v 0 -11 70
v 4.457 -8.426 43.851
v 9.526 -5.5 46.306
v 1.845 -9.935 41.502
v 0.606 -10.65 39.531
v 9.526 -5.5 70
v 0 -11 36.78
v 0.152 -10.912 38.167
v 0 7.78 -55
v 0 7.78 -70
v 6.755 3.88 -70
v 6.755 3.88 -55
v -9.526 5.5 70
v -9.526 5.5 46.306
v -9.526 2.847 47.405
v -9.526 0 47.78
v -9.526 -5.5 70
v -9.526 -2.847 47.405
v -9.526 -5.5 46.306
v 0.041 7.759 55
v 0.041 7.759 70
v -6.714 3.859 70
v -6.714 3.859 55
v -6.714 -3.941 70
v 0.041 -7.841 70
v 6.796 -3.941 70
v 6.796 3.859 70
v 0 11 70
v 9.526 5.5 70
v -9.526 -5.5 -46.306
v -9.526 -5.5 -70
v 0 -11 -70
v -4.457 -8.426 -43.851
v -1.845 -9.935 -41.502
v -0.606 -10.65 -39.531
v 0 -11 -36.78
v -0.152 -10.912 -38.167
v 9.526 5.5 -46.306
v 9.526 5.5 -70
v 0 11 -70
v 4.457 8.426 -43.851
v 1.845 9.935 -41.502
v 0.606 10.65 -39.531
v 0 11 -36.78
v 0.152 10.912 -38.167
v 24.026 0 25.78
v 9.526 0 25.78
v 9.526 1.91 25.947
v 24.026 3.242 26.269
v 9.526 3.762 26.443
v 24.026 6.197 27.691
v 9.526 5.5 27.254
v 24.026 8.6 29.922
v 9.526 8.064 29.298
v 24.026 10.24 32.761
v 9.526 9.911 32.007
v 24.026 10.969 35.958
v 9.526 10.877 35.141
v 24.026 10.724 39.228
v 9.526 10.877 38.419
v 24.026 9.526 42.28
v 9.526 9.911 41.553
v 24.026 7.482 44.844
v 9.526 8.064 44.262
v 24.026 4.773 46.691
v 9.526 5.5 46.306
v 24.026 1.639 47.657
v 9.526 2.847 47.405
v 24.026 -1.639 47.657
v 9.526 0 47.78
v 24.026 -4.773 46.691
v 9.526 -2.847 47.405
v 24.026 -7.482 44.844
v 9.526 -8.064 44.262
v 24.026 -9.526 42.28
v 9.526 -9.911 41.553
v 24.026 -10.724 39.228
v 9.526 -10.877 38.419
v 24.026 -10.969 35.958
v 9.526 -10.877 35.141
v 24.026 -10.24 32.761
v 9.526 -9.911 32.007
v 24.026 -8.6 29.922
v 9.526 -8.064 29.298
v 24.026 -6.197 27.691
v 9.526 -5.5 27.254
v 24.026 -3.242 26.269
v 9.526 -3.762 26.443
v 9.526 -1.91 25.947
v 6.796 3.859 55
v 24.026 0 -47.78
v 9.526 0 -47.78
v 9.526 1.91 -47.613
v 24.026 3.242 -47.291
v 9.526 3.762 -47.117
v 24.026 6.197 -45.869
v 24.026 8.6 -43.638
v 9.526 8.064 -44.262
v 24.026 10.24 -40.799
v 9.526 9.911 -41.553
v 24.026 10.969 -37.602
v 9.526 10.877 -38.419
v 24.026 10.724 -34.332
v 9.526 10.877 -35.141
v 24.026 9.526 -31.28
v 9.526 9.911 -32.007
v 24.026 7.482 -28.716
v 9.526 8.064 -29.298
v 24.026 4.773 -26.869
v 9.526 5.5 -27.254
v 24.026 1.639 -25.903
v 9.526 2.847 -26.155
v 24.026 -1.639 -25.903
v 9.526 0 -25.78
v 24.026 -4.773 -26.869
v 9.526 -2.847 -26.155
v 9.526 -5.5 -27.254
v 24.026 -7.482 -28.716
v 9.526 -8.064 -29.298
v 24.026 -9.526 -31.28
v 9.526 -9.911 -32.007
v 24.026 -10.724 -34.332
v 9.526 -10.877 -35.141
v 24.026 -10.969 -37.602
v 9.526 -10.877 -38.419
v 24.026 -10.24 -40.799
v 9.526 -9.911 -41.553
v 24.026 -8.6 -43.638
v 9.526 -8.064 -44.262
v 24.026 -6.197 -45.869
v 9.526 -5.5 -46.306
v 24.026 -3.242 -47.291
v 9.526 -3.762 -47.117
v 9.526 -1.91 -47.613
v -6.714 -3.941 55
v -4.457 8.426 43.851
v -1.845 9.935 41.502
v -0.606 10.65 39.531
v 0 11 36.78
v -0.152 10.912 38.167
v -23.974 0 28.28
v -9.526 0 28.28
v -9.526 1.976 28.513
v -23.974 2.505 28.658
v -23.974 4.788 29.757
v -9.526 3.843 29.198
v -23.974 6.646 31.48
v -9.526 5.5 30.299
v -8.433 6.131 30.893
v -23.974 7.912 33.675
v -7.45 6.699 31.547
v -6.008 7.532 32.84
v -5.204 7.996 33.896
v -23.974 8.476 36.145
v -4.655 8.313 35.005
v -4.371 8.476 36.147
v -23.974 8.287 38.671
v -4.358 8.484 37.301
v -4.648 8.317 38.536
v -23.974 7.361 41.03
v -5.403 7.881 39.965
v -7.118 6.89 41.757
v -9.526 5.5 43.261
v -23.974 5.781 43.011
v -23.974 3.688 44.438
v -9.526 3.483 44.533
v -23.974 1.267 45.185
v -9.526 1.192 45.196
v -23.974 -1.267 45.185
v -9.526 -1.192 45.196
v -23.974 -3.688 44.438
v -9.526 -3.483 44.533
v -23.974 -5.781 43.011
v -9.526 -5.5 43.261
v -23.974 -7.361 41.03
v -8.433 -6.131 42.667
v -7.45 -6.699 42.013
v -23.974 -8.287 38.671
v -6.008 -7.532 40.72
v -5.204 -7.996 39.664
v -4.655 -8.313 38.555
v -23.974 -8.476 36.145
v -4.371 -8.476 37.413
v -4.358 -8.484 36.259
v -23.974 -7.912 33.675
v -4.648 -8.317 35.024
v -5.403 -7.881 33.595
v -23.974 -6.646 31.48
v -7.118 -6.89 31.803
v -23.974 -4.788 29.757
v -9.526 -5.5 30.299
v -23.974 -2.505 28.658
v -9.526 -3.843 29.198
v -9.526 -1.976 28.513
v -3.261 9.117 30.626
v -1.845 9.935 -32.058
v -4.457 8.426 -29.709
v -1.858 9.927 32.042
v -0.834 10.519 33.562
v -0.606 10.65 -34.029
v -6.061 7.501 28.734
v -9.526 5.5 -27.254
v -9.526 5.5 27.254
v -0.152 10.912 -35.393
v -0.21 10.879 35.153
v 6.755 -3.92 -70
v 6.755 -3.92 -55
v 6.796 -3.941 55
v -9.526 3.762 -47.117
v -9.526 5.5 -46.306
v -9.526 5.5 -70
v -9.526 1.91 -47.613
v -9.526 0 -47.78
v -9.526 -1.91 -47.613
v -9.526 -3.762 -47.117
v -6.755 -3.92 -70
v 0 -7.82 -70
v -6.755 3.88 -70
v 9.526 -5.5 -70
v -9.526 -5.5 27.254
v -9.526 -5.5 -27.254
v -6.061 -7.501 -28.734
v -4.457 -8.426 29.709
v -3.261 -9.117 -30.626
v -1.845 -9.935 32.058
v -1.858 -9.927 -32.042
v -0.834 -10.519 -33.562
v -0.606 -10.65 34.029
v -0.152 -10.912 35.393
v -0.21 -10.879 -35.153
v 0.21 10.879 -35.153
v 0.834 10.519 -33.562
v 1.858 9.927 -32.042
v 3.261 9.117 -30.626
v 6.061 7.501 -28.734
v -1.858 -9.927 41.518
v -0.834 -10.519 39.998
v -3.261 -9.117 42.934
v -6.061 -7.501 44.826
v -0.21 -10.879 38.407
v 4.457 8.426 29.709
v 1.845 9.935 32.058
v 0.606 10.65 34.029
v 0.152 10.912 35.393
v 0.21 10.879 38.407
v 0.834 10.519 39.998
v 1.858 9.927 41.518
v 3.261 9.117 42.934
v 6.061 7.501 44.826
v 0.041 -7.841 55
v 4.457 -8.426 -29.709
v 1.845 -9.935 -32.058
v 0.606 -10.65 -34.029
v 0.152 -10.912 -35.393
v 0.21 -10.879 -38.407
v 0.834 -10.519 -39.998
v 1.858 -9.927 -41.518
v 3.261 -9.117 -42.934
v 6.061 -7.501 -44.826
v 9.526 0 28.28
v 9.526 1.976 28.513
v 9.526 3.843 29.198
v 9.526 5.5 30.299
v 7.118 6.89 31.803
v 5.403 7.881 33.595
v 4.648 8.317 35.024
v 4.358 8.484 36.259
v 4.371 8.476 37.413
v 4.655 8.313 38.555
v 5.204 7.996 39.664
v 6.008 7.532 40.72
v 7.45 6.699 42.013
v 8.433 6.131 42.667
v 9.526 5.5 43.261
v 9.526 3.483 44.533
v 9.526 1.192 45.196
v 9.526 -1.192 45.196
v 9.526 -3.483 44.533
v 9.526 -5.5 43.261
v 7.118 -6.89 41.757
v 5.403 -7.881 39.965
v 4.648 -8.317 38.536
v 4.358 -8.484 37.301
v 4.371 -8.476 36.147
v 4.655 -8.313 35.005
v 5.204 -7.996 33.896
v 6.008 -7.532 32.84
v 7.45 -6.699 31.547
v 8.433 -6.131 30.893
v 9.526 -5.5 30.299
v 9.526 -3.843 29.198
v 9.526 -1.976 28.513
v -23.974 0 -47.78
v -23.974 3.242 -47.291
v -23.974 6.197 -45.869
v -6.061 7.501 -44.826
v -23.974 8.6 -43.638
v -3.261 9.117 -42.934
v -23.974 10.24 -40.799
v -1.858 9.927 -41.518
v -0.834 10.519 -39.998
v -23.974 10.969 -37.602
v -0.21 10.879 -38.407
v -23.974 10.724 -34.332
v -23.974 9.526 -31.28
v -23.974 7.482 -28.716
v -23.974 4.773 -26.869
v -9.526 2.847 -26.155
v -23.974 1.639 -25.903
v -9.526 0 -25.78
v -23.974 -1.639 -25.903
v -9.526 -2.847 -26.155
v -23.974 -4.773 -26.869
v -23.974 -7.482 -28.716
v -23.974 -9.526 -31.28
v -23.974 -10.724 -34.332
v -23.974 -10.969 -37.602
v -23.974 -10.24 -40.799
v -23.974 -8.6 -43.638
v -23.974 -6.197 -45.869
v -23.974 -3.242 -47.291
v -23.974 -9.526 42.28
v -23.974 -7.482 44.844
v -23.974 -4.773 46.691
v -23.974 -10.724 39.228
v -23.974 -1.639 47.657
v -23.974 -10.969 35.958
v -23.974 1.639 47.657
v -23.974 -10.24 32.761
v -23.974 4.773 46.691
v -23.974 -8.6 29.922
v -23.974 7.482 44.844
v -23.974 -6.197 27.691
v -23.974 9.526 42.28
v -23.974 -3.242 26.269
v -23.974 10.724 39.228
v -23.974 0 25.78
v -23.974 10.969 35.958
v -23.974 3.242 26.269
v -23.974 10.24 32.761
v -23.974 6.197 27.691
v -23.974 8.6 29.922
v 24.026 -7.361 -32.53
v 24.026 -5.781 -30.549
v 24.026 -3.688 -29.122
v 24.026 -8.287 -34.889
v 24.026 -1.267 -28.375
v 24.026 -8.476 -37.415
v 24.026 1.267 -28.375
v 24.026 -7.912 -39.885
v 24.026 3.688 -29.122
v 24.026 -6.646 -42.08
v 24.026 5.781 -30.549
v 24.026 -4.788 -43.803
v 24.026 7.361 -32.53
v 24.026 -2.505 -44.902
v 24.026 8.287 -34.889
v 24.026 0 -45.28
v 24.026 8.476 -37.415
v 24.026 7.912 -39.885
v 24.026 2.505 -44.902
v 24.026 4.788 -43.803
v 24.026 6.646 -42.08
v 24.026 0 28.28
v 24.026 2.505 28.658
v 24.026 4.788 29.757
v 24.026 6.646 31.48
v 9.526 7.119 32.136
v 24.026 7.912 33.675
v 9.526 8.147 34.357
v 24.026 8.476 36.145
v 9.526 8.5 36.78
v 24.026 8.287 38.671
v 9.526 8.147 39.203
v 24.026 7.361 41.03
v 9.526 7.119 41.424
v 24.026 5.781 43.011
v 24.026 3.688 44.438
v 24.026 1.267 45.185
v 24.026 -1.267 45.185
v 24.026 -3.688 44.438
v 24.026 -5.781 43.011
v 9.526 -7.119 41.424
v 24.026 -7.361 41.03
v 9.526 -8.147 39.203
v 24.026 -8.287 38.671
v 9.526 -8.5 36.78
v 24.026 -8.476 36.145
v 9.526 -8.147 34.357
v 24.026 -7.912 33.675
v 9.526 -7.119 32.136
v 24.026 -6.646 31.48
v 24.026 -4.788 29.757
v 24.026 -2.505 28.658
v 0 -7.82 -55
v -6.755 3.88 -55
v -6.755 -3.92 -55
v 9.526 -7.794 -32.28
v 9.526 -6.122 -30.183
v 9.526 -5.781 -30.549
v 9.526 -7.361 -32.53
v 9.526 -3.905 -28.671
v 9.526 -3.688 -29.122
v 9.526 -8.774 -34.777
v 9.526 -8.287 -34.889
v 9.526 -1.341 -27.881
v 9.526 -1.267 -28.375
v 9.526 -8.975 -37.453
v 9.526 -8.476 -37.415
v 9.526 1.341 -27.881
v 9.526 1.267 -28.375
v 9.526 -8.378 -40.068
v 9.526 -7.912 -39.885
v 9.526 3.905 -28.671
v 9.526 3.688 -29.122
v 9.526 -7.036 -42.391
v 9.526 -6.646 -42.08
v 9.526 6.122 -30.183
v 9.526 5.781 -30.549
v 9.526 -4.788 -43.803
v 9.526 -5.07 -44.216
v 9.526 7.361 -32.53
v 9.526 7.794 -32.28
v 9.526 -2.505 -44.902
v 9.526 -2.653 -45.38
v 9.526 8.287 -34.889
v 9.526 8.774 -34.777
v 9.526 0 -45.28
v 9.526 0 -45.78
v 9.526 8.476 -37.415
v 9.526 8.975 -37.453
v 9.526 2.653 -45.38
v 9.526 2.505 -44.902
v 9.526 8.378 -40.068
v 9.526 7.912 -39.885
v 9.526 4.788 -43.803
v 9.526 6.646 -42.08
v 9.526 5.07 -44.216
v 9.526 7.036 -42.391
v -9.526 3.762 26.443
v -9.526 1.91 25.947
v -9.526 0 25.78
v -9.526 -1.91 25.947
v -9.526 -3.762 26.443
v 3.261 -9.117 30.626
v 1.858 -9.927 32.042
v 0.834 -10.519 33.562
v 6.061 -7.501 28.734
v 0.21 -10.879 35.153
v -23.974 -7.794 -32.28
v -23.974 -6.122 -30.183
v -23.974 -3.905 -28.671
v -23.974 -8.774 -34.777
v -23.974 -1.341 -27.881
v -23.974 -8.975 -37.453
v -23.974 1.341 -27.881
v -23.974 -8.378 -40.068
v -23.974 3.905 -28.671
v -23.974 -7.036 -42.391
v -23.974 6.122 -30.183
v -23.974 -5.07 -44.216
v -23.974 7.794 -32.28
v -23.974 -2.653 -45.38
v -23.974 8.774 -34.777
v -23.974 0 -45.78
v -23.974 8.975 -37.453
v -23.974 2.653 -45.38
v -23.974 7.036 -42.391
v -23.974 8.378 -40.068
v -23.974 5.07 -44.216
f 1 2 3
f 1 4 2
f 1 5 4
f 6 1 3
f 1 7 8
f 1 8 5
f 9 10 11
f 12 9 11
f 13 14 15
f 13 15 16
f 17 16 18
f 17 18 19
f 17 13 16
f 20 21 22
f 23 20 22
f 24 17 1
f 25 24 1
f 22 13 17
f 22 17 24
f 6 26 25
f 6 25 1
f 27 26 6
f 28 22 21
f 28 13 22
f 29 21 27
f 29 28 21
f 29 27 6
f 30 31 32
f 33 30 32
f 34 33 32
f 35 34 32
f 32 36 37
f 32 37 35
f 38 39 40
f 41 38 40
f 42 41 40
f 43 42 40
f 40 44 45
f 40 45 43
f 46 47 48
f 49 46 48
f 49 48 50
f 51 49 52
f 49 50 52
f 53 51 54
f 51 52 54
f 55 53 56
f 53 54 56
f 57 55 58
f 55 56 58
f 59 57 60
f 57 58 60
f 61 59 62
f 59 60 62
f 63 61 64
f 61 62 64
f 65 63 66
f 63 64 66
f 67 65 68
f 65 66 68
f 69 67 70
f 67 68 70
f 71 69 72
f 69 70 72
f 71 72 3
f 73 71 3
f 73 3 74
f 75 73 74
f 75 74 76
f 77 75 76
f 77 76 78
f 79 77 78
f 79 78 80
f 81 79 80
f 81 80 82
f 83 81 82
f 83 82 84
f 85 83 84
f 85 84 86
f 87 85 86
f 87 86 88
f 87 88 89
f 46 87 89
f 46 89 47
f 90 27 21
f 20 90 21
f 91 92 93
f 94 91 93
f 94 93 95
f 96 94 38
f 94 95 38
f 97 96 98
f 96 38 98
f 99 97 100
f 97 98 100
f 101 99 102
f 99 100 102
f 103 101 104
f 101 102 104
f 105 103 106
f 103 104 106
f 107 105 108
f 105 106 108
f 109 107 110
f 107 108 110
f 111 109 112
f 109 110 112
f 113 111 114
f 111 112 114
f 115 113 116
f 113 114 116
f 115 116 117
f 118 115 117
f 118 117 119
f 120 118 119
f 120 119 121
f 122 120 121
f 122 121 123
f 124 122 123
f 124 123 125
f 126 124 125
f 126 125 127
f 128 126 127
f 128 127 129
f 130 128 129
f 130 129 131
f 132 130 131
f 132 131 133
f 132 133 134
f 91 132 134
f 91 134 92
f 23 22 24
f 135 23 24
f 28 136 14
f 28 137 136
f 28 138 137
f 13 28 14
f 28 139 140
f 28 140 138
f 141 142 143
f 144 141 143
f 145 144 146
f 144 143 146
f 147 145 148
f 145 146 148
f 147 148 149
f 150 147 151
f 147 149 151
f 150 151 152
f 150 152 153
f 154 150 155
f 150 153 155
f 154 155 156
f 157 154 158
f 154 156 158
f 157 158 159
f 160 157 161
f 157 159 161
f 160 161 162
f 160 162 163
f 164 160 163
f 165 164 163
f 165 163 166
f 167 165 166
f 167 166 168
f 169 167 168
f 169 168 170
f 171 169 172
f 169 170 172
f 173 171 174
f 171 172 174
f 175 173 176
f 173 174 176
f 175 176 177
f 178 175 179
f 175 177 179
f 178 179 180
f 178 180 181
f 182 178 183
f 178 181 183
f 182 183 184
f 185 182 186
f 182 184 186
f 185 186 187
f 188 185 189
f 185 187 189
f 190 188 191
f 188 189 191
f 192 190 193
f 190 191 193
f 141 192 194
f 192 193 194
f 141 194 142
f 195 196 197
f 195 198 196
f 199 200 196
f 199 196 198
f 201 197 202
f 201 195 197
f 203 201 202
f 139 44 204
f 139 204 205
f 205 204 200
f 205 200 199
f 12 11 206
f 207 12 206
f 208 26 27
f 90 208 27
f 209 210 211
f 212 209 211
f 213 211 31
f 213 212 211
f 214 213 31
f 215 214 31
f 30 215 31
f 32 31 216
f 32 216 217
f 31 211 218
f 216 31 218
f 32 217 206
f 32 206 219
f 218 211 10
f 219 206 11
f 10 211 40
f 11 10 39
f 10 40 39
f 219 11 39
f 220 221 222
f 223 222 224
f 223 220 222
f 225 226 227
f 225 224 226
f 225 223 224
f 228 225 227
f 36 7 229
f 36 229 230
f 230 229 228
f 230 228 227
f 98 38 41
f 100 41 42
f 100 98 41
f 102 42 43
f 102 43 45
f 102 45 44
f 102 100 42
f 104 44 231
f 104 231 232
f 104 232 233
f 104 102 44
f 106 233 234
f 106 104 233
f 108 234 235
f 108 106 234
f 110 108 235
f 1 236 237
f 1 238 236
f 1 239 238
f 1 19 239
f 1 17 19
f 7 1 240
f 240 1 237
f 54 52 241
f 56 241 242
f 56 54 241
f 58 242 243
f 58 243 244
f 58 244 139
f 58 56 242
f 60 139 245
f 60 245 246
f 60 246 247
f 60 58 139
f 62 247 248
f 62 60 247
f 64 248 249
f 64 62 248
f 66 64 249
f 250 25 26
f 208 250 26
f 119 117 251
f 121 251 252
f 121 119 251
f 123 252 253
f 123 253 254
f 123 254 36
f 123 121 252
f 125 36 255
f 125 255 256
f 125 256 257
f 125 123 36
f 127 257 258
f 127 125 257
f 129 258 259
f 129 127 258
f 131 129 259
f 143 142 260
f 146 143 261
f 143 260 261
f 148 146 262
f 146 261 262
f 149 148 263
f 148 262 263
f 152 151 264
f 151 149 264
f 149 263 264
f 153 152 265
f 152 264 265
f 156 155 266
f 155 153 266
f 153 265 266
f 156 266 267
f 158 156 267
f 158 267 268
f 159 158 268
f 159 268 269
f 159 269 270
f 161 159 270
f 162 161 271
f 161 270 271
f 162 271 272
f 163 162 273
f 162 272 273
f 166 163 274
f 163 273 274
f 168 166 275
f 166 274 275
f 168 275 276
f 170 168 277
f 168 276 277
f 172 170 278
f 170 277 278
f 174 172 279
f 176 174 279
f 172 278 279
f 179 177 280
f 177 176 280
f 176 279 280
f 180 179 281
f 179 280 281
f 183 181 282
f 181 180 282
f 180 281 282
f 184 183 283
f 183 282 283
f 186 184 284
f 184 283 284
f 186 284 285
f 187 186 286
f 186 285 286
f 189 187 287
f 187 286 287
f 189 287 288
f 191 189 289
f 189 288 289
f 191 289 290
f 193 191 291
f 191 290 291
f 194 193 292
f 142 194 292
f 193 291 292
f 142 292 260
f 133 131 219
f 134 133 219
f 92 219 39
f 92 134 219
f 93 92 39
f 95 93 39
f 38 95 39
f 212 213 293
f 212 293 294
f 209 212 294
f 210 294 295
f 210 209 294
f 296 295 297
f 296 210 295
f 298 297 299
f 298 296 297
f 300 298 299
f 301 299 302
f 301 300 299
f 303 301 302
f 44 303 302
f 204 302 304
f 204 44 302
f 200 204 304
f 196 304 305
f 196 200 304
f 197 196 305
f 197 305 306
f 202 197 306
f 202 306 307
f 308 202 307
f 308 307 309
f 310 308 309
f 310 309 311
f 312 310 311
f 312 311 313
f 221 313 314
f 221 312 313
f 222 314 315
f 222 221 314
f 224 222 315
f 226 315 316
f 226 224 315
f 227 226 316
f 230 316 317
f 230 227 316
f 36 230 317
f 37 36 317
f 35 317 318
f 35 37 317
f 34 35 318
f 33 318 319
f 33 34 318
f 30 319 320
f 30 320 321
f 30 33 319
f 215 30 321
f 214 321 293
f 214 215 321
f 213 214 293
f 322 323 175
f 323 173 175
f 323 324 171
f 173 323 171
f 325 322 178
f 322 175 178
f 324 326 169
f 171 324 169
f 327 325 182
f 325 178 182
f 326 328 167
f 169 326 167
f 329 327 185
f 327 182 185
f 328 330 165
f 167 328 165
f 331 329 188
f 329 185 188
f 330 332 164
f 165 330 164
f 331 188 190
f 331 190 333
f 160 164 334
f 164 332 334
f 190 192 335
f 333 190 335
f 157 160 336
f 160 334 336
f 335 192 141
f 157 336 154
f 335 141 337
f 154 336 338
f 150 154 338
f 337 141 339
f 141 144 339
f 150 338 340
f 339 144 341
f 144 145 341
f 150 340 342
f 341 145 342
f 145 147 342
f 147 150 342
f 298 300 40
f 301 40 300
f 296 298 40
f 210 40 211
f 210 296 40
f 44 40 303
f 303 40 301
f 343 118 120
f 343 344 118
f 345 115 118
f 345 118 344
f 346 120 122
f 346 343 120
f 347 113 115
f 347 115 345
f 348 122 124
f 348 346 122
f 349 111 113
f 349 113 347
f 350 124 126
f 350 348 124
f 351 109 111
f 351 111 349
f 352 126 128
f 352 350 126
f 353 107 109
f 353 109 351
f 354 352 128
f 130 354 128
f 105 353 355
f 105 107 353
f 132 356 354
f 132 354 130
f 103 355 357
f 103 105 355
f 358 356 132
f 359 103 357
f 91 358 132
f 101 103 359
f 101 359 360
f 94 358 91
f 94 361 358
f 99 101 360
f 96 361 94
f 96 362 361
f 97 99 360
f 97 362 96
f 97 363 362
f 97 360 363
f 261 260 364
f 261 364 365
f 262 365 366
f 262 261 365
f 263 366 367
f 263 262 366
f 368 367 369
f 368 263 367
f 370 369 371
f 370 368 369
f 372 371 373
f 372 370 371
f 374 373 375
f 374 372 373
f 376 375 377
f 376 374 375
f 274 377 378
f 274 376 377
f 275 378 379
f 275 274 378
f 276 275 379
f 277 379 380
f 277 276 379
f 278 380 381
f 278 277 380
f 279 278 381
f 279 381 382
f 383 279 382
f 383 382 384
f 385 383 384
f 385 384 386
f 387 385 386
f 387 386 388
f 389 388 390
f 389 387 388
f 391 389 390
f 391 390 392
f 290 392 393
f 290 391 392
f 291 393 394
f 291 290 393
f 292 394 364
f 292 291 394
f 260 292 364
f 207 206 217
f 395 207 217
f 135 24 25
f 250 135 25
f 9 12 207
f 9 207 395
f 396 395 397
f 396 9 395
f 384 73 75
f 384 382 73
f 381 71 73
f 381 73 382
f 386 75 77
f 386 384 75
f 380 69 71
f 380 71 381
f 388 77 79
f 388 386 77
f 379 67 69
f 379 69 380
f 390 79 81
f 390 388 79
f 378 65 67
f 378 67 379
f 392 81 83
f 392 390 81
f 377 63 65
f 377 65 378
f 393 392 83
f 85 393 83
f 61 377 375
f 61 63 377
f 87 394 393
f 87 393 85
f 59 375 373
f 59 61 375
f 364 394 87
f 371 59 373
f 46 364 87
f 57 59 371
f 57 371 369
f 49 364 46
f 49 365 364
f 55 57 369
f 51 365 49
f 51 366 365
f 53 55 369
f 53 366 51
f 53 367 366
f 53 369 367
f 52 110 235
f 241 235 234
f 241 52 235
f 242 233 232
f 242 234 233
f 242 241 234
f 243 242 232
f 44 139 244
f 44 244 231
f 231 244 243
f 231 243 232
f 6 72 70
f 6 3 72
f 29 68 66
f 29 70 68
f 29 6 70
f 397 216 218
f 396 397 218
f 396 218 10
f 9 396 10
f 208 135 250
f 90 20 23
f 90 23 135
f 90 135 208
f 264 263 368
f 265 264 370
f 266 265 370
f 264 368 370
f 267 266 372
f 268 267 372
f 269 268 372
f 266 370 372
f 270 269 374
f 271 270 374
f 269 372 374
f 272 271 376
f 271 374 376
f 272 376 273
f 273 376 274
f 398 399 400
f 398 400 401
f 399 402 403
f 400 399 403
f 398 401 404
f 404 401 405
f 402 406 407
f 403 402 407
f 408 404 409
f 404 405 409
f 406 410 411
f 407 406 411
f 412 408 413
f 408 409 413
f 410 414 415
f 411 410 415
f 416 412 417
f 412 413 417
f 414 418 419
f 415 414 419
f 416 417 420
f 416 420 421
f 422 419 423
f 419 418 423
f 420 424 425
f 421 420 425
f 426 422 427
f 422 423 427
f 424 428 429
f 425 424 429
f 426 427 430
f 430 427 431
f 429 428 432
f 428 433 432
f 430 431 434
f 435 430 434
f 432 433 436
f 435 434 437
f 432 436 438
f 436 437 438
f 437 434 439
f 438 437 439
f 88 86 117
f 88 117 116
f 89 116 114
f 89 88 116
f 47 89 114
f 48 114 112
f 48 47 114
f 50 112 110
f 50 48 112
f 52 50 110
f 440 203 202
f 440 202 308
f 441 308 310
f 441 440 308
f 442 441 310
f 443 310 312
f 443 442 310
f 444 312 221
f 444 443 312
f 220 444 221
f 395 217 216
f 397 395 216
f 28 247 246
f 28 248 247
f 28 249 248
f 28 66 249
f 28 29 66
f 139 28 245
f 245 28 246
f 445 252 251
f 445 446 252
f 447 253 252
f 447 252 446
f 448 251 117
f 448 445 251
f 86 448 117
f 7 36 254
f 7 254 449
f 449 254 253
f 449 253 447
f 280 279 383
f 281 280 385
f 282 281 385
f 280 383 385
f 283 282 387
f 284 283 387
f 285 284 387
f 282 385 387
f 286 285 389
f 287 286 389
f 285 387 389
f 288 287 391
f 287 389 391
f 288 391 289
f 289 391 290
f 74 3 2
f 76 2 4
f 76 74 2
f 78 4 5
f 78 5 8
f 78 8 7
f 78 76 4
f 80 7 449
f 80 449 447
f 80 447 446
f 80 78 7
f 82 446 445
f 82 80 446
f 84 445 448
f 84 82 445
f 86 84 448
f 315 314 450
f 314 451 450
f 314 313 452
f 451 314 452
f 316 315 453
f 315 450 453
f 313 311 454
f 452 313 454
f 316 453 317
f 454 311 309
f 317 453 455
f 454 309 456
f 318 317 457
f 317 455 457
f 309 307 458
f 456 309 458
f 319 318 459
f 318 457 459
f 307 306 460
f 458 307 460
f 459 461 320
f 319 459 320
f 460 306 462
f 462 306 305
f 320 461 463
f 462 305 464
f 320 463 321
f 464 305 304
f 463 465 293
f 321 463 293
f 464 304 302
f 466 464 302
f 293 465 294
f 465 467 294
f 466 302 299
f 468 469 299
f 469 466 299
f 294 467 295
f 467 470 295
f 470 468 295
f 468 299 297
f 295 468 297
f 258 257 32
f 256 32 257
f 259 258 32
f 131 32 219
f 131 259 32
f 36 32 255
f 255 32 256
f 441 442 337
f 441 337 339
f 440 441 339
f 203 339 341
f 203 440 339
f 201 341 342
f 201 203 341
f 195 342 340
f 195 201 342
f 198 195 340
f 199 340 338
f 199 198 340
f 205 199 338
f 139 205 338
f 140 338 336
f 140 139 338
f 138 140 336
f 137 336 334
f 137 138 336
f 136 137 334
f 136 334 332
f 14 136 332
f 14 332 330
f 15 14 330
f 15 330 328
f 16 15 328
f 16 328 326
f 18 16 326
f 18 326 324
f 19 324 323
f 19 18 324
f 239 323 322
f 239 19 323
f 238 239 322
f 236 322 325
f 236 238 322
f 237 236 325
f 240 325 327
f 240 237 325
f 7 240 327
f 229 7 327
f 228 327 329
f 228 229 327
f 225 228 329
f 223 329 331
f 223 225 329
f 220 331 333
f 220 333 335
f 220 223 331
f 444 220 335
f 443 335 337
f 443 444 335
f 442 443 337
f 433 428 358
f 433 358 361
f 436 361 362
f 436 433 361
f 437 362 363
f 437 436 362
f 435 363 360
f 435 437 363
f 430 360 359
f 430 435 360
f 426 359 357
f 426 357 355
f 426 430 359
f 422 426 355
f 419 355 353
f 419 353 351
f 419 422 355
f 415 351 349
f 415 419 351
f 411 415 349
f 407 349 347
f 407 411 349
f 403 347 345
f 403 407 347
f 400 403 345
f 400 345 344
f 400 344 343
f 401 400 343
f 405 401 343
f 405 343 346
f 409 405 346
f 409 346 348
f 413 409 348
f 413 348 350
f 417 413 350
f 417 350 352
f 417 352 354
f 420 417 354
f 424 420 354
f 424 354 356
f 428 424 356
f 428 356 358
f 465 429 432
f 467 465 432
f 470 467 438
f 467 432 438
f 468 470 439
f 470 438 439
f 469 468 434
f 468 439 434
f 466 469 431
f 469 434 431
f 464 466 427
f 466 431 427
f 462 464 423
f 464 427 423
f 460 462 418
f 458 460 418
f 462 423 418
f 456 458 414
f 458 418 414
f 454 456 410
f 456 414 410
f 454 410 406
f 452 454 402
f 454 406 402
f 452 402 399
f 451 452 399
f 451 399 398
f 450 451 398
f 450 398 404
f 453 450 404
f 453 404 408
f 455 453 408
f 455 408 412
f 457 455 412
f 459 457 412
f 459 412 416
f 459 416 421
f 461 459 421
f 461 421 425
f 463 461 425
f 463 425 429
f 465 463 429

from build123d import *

# Parameters (mm, degrees)
BOSS_EXTRUDE2_DEPTH      = 70
CUT_EXTRUDE6_DEPTH       = 15
CUT_EXTRUDE7_DEPTH       = 15
BOSS_EXTRUDE3_DEPTH      = 14.5
BOSS_EXTRUDE3_DEPTH_BACK = 33.5
SKETCH3_R                = 11
SKETCH3_R_2              = 8.5
SKETCH12_R               = 8.5
SKETCH12_R_2             = 9
CUT_EXTRUDE8_DEPTH       = 79.378887463


with BuildPart() as part:
    # Sketch1<3> → Boss-Extrude2 (new, symmetric)
    with BuildSketch(Plane.XY):
        Polygon((-9.526279442, -5.5), (0, -11), (9.526279442, -5.5), (9.526279442, 5.5), (0, 11), (-9.526279442, 5.5), align=None)
    extrude(amount=BOSS_EXTRUDE2_DEPTH, both=True)

    # Sketch10 → Cut-Extrude6 (cut)
    with BuildSketch(Plane.XY.offset(70)):
        Polygon((0.040785795, -7.840785795), (6.795783944, -3.940785795), (6.795783944, 3.859214205), (0.040785795, 7.759214205), (-6.714212355, 3.859214205), (-6.714212355, -3.940785795), align=None)
    extrude(amount=-CUT_EXTRUDE6_DEPTH, mode=Mode.SUBTRACT)

    # Sketch11 → Cut-Extrude7 (cut)
    with BuildSketch(Plane(origin=(0, 0, -70), x_dir=(-1, 0, 0), z_dir=(0, 0, -1))):
        Polygon((0, -7.820392897), (6.75499815, -3.920392897), (6.75499815, 3.879607103), (0, 7.779607103), (-6.75499815, 3.879607103), (-6.75499815, -3.920392897), align=None)
    extrude(amount=-CUT_EXTRUDE7_DEPTH, mode=Mode.SUBTRACT)

    # Sketch3 → Boss-Extrude3 (add, two sides: drawn at the far end of the back side and taken through both)
    # profile 1 of 2: a face of its own
    with BuildSketch(Plane(origin=(9.526279442, 0, 0), x_dir=(0, 0, -1), z_dir=(1, 0, 0)).offset(-BOSS_EXTRUDE3_DEPTH_BACK)):
        with Locations((-36.78, 0)):
            Circle(SKETCH3_R)
        with Locations((-36.78, 0)):
            Circle(SKETCH3_R_2, mode=Mode.SUBTRACT)
    # profile 2 of 2: a face of its own
    with BuildSketch(Plane(origin=(9.526279442, 0, 0), x_dir=(0, 0, -1), z_dir=(1, 0, 0)).offset(-BOSS_EXTRUDE3_DEPTH_BACK)):
        with Locations((36.78, 0)):
            Circle(SKETCH3_R)
        with Locations((36.78, 0)):
            Circle(SKETCH3_R_2, mode=Mode.SUBTRACT)
    extrude(amount=BOSS_EXTRUDE3_DEPTH + BOSS_EXTRUDE3_DEPTH_BACK)

    # Sketch12 → Cut-Extrude8 (cut, through all)
    with BuildSketch(Plane(origin=(9.526279442, 0, 0), x_dir=(0, 0, -1), z_dir=(1, 0, 0))):
        with Locations((-36.78, 0)):
            Circle(SKETCH12_R)
        with Locations((36.78, 0)):
            Circle(SKETCH12_R_2)
    extrude(amount=-CUT_EXTRUDE8_DEPTH, mode=Mode.SUBTRACT)


solid = part.part
